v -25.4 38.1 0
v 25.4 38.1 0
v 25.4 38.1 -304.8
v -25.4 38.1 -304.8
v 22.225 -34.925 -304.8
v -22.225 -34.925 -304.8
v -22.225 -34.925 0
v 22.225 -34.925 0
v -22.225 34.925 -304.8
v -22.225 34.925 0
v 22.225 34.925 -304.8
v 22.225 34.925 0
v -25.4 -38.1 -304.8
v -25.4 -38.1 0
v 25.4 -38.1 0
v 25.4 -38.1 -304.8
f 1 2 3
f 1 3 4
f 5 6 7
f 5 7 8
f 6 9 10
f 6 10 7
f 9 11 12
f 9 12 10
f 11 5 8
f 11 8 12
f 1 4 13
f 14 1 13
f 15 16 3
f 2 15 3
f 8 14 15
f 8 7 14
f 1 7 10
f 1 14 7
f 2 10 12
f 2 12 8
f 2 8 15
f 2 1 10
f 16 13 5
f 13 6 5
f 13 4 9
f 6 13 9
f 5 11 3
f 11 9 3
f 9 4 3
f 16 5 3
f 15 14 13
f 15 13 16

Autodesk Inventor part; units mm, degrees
ref_plane "YZ Plane" through (0, 0, 0) normal (1, 0, 0) x (0, 1, 0)
ref_plane "XZ Plane" through (0, 0, 0) normal (0, 1, 0) x (-1, 0, 0)
ref_plane "XY Plane" through (0, 0, 0) normal (0, 0, 1) x (1, 0, 0)
sketch "Sketch1" plane through (0, 0, 0) normal (0, 0, 1) x (1, 0, 0)
  line L0 (-25.4, -38.1) -> (25.4, -38.1)
  line L1 (25.4, -38.1) -> (25.4, 38.1)
  line L2 (25.4, 38.1) -> (-25.4, 38.1)
  line L3 (-25.4, 38.1) -> (-25.4, -38.1)
  line L4 (-25.4, -38.1) -> (25.4, 38.1) construction
  line L5 (25.4, -38.1) -> (-25.4, 38.1) construction
  line L6 (-22.225, -34.925) -> (22.225, -34.925)
  line L7 (22.225, -34.925) -> (22.225, 34.925)
  line L8 (22.225, 34.925) -> (-22.225, 34.925)
  line L9 (-22.225, 34.925) -> (-22.225, -34.925)
  line L10 (-22.225, -34.925) -> (22.225, 34.925) construction
  line L11 (22.225, -34.925) -> (-22.225, 34.925) construction
  point P0 (0, 0)
  dimension "d0" = 50.8
  dimension "d1" = 76.2
  dimension "d2" = 3.175
  dimension "d3" = 3.175
extrude "Extrusion1" add sketch "Sketch1" against normal blind 304.8
properties part number "2x2x1_8_rectangularTubing" material "Aluminum 6061"
